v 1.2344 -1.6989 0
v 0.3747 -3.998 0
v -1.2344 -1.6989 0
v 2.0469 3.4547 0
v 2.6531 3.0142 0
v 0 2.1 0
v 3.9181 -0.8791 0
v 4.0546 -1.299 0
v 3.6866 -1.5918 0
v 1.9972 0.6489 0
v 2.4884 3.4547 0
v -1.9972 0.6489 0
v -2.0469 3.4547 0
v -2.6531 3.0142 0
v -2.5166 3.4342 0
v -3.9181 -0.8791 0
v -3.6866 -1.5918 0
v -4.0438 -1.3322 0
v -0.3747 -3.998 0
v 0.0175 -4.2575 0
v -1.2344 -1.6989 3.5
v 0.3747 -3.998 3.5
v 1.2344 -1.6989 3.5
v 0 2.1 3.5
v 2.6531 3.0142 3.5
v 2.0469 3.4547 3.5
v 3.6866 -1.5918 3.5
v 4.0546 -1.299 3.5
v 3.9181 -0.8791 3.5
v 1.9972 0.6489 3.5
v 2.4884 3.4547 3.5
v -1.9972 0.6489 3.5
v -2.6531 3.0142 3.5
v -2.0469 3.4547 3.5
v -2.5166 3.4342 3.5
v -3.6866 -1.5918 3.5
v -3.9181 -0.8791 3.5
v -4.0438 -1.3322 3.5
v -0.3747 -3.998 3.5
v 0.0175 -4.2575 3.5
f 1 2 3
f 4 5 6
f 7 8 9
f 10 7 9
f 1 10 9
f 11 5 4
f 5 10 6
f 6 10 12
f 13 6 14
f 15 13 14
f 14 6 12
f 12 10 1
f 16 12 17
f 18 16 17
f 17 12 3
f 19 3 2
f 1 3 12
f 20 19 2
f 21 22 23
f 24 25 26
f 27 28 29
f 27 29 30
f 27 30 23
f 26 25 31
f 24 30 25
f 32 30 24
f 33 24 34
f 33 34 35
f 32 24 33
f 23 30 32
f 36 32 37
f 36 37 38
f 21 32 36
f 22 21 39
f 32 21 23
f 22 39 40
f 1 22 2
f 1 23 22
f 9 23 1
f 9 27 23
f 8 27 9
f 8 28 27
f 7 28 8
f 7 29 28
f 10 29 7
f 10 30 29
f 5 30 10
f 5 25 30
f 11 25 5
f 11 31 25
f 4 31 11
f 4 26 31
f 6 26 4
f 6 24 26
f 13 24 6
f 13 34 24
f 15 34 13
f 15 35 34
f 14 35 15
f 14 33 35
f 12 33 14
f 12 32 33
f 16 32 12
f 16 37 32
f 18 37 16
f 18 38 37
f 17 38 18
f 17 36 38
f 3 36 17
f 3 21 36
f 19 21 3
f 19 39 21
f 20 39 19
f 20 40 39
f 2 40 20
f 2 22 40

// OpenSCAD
// studs/star.scad — 5-pointed star.
// MIT licensed.
//
// Festival set. Polygon star linear_extruded to a low profile. `tip_radius`
// softens the tips so they don't stab through clothing.

module stud_star(size = 6, tip_radius = 0.4, height = undef) {
    h = is_undef(height) ? size * 0.35 : height;
    outer_r = size / 2;
    // 5-point star: alternating outer/inner radii at 10 angles.
    inner_r = outer_r * 0.42;
    points = [
        for (i = [0 : 9]) let (
            angle = i * 36 - 90,         // start pointing up
            r = (i % 2 == 0) ? outer_r : inner_r
        ) [r * cos(angle), r * sin(angle)]
    ];

    if (tip_radius > 0) {
        // Round the tips by offsetting in and back out.
        linear_extrude(height = h)
            offset(r = tip_radius)
                offset(delta = -tip_radius)
                    polygon(points);
    } else {
        linear_extrude(height = h)
            polygon(points);
    }
}

stud_star(size = 10);
